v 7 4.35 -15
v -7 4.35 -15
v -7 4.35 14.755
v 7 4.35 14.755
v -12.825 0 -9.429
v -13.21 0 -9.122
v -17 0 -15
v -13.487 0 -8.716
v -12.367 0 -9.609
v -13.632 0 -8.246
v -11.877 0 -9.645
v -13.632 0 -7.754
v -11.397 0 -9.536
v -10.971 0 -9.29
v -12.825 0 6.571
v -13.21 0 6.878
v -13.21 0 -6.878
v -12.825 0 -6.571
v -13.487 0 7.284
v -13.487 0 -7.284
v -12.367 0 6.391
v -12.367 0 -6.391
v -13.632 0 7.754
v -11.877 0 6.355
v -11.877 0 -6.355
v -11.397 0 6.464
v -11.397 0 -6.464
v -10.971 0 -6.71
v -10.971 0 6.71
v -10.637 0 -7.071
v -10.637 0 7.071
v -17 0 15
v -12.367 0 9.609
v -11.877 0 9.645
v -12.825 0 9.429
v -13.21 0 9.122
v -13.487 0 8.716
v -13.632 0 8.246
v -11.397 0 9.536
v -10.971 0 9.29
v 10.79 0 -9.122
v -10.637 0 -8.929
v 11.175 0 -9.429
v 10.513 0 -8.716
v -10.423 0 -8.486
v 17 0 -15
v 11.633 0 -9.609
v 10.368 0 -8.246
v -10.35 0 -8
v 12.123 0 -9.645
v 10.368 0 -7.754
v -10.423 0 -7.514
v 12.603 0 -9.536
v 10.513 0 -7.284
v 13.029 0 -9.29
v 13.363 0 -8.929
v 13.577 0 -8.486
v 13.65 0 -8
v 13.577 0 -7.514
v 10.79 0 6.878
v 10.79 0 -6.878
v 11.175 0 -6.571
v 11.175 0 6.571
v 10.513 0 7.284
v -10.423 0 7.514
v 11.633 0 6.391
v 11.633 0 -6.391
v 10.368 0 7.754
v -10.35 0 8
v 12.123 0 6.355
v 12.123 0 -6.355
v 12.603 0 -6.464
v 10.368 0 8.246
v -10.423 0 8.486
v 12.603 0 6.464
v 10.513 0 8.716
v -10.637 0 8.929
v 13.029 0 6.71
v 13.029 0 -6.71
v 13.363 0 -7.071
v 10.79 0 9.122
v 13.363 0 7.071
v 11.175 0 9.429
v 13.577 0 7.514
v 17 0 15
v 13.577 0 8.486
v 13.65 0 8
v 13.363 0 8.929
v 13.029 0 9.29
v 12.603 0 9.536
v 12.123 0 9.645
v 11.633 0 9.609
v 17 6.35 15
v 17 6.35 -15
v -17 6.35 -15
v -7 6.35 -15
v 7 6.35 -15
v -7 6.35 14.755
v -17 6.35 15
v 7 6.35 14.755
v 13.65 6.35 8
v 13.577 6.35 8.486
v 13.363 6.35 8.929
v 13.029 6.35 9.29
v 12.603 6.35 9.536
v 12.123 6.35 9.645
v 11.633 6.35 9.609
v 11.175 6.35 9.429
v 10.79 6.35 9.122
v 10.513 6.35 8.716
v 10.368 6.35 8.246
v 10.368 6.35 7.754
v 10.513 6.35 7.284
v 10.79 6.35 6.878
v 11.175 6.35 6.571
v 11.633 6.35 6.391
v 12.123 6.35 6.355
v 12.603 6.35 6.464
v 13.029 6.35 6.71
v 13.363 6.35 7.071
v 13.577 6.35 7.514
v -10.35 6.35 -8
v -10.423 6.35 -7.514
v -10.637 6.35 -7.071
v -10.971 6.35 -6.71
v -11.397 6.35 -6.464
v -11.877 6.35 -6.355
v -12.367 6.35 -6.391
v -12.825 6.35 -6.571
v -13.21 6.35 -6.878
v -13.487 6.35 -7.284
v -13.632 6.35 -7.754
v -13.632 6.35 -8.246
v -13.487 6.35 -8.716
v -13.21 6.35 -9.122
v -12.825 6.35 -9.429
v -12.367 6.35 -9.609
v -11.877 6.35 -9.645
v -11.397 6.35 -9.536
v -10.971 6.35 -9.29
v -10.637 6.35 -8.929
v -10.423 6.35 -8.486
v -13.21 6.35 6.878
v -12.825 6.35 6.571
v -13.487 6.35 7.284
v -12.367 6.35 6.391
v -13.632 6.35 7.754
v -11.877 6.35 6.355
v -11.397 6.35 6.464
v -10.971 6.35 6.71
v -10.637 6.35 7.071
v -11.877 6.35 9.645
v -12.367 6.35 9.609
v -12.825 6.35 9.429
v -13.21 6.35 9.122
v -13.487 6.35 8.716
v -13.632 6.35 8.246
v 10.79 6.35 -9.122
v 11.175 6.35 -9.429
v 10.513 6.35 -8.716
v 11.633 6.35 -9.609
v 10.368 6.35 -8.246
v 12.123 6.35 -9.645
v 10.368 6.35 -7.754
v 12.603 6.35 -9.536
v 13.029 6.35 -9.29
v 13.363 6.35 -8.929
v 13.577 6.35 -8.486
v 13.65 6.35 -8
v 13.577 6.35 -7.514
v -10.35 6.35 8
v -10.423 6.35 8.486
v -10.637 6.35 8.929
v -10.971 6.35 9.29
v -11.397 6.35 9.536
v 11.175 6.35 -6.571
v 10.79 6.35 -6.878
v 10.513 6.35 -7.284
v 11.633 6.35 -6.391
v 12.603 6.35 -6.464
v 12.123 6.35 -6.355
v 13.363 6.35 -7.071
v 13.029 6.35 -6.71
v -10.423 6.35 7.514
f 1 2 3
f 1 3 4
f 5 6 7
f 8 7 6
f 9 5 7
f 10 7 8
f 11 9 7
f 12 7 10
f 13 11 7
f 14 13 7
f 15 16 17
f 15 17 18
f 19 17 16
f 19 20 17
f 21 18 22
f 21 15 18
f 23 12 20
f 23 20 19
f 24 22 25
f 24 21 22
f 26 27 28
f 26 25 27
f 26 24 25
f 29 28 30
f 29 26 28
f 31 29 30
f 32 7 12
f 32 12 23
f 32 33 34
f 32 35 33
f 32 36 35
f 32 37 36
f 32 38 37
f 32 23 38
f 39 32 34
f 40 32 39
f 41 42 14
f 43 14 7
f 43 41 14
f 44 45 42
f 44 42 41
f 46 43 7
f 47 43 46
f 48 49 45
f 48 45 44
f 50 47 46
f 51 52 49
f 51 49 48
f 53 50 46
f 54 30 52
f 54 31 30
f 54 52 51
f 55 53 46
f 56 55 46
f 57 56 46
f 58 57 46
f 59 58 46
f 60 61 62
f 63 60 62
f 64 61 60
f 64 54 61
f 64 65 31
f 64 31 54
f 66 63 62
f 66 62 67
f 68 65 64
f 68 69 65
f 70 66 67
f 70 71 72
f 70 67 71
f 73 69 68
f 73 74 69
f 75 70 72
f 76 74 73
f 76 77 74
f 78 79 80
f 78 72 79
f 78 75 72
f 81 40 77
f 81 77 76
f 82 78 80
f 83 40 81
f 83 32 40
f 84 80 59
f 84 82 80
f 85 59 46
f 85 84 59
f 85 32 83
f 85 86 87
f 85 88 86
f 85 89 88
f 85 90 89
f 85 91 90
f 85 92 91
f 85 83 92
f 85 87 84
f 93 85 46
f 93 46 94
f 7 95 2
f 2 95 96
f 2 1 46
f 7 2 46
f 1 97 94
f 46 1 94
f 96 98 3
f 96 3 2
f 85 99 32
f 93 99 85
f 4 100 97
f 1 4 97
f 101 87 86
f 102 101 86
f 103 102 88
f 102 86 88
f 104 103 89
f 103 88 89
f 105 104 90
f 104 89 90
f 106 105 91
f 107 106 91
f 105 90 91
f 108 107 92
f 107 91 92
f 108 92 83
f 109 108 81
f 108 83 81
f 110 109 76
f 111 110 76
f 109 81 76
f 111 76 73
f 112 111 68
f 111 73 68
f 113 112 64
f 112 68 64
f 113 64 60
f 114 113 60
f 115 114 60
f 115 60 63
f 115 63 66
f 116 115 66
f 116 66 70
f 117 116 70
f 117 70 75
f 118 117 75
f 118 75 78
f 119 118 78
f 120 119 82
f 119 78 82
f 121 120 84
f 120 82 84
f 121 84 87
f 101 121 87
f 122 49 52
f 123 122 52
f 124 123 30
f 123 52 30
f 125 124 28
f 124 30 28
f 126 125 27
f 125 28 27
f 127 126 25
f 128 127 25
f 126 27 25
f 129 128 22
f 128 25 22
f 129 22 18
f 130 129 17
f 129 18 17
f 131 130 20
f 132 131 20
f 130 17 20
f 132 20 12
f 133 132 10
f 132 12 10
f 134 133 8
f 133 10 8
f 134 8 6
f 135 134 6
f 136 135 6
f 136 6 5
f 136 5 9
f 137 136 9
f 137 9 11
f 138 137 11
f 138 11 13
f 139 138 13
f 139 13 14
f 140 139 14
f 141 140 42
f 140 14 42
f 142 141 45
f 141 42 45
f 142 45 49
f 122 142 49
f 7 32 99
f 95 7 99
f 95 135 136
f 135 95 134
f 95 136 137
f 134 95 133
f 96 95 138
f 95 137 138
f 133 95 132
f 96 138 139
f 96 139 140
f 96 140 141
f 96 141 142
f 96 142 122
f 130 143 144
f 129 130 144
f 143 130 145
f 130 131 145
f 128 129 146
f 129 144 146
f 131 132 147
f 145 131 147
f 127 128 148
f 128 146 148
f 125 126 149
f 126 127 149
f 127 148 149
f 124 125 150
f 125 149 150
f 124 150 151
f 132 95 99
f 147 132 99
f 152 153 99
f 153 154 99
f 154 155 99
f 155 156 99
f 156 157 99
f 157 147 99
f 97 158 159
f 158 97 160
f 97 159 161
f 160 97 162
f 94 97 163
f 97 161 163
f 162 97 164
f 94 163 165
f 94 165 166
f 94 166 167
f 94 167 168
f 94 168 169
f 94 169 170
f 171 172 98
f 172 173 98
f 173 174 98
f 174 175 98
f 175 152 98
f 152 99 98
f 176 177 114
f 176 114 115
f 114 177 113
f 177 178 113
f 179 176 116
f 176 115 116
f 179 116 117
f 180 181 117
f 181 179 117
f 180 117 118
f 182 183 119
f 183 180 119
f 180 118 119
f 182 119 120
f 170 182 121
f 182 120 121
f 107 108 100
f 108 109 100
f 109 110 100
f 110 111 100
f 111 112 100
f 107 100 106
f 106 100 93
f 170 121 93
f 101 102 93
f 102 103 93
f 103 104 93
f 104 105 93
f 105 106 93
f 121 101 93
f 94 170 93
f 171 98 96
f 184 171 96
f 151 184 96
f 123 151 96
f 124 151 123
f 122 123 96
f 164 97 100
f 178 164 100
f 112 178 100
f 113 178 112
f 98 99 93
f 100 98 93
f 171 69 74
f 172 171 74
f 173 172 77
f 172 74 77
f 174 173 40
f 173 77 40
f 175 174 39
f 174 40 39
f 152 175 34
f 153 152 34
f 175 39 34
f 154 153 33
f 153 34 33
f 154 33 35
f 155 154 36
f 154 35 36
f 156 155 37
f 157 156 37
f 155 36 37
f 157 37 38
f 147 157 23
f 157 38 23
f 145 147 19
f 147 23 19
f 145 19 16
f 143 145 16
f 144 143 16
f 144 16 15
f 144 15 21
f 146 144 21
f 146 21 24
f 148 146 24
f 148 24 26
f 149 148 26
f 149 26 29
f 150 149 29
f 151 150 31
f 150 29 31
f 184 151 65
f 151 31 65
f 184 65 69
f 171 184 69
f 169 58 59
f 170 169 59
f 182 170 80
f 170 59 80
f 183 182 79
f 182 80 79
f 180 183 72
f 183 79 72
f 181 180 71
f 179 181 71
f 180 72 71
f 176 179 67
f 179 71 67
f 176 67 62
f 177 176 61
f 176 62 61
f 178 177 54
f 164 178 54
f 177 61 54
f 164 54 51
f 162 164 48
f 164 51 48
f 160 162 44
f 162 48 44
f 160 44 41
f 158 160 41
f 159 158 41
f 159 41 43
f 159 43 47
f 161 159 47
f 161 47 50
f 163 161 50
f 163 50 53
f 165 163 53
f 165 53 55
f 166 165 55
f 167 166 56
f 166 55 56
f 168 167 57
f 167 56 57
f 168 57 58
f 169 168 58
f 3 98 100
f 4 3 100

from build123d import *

# Parameters (mm, degrees)
SKETCH1_W           = 34
SKETCH1_H           = 6.35
BOSS_EXTRUDE2_DEPTH = 15
SKETCH3_R           = 1.65
CUT_EXTRUDE1_DEPTH  = 6.35
SKETCH4_W           = 14
SKETCH4_H           = 29.754966952
CUT_EXTRUDE2_DEPTH  = 2


with BuildPart() as part:
    # Sketch1 → Boss-Extrude2 (new body, symmetric)
    with BuildSketch(Plane.XY):
        with Locations((0, 3.175)):
            Rectangle(SKETCH1_W, SKETCH1_H)
    extrude(amount=BOSS_EXTRUDE2_DEPTH, both=True)

    # Sketch3 → Cut-Extrude1 (cut)
    with BuildSketch(Plane.XZ):
        with Locations((-12, 8)):
            Circle(SKETCH3_R)
        with Locations((12, 8)):
            Circle(SKETCH3_R)
        with Locations((-12, -8)):
            Circle(SKETCH3_R)
        with Locations((12, -8)):
            Circle(SKETCH3_R)
    extrude(amount=-CUT_EXTRUDE1_DEPTH, mode=Mode.SUBTRACT)

    # Sketch4 → Cut-Extrude2 (cut)
    with BuildSketch(Plane(origin=(0, 6.35, 0), x_dir=(1, 0, 0), z_dir=(0, 1, 0))):
        with Locations((0, 0.122516524)):
            Rectangle(SKETCH4_W, SKETCH4_H)
    extrude(amount=-CUT_EXTRUDE2_DEPTH, mode=Mode.SUBTRACT)


solid = part.part
